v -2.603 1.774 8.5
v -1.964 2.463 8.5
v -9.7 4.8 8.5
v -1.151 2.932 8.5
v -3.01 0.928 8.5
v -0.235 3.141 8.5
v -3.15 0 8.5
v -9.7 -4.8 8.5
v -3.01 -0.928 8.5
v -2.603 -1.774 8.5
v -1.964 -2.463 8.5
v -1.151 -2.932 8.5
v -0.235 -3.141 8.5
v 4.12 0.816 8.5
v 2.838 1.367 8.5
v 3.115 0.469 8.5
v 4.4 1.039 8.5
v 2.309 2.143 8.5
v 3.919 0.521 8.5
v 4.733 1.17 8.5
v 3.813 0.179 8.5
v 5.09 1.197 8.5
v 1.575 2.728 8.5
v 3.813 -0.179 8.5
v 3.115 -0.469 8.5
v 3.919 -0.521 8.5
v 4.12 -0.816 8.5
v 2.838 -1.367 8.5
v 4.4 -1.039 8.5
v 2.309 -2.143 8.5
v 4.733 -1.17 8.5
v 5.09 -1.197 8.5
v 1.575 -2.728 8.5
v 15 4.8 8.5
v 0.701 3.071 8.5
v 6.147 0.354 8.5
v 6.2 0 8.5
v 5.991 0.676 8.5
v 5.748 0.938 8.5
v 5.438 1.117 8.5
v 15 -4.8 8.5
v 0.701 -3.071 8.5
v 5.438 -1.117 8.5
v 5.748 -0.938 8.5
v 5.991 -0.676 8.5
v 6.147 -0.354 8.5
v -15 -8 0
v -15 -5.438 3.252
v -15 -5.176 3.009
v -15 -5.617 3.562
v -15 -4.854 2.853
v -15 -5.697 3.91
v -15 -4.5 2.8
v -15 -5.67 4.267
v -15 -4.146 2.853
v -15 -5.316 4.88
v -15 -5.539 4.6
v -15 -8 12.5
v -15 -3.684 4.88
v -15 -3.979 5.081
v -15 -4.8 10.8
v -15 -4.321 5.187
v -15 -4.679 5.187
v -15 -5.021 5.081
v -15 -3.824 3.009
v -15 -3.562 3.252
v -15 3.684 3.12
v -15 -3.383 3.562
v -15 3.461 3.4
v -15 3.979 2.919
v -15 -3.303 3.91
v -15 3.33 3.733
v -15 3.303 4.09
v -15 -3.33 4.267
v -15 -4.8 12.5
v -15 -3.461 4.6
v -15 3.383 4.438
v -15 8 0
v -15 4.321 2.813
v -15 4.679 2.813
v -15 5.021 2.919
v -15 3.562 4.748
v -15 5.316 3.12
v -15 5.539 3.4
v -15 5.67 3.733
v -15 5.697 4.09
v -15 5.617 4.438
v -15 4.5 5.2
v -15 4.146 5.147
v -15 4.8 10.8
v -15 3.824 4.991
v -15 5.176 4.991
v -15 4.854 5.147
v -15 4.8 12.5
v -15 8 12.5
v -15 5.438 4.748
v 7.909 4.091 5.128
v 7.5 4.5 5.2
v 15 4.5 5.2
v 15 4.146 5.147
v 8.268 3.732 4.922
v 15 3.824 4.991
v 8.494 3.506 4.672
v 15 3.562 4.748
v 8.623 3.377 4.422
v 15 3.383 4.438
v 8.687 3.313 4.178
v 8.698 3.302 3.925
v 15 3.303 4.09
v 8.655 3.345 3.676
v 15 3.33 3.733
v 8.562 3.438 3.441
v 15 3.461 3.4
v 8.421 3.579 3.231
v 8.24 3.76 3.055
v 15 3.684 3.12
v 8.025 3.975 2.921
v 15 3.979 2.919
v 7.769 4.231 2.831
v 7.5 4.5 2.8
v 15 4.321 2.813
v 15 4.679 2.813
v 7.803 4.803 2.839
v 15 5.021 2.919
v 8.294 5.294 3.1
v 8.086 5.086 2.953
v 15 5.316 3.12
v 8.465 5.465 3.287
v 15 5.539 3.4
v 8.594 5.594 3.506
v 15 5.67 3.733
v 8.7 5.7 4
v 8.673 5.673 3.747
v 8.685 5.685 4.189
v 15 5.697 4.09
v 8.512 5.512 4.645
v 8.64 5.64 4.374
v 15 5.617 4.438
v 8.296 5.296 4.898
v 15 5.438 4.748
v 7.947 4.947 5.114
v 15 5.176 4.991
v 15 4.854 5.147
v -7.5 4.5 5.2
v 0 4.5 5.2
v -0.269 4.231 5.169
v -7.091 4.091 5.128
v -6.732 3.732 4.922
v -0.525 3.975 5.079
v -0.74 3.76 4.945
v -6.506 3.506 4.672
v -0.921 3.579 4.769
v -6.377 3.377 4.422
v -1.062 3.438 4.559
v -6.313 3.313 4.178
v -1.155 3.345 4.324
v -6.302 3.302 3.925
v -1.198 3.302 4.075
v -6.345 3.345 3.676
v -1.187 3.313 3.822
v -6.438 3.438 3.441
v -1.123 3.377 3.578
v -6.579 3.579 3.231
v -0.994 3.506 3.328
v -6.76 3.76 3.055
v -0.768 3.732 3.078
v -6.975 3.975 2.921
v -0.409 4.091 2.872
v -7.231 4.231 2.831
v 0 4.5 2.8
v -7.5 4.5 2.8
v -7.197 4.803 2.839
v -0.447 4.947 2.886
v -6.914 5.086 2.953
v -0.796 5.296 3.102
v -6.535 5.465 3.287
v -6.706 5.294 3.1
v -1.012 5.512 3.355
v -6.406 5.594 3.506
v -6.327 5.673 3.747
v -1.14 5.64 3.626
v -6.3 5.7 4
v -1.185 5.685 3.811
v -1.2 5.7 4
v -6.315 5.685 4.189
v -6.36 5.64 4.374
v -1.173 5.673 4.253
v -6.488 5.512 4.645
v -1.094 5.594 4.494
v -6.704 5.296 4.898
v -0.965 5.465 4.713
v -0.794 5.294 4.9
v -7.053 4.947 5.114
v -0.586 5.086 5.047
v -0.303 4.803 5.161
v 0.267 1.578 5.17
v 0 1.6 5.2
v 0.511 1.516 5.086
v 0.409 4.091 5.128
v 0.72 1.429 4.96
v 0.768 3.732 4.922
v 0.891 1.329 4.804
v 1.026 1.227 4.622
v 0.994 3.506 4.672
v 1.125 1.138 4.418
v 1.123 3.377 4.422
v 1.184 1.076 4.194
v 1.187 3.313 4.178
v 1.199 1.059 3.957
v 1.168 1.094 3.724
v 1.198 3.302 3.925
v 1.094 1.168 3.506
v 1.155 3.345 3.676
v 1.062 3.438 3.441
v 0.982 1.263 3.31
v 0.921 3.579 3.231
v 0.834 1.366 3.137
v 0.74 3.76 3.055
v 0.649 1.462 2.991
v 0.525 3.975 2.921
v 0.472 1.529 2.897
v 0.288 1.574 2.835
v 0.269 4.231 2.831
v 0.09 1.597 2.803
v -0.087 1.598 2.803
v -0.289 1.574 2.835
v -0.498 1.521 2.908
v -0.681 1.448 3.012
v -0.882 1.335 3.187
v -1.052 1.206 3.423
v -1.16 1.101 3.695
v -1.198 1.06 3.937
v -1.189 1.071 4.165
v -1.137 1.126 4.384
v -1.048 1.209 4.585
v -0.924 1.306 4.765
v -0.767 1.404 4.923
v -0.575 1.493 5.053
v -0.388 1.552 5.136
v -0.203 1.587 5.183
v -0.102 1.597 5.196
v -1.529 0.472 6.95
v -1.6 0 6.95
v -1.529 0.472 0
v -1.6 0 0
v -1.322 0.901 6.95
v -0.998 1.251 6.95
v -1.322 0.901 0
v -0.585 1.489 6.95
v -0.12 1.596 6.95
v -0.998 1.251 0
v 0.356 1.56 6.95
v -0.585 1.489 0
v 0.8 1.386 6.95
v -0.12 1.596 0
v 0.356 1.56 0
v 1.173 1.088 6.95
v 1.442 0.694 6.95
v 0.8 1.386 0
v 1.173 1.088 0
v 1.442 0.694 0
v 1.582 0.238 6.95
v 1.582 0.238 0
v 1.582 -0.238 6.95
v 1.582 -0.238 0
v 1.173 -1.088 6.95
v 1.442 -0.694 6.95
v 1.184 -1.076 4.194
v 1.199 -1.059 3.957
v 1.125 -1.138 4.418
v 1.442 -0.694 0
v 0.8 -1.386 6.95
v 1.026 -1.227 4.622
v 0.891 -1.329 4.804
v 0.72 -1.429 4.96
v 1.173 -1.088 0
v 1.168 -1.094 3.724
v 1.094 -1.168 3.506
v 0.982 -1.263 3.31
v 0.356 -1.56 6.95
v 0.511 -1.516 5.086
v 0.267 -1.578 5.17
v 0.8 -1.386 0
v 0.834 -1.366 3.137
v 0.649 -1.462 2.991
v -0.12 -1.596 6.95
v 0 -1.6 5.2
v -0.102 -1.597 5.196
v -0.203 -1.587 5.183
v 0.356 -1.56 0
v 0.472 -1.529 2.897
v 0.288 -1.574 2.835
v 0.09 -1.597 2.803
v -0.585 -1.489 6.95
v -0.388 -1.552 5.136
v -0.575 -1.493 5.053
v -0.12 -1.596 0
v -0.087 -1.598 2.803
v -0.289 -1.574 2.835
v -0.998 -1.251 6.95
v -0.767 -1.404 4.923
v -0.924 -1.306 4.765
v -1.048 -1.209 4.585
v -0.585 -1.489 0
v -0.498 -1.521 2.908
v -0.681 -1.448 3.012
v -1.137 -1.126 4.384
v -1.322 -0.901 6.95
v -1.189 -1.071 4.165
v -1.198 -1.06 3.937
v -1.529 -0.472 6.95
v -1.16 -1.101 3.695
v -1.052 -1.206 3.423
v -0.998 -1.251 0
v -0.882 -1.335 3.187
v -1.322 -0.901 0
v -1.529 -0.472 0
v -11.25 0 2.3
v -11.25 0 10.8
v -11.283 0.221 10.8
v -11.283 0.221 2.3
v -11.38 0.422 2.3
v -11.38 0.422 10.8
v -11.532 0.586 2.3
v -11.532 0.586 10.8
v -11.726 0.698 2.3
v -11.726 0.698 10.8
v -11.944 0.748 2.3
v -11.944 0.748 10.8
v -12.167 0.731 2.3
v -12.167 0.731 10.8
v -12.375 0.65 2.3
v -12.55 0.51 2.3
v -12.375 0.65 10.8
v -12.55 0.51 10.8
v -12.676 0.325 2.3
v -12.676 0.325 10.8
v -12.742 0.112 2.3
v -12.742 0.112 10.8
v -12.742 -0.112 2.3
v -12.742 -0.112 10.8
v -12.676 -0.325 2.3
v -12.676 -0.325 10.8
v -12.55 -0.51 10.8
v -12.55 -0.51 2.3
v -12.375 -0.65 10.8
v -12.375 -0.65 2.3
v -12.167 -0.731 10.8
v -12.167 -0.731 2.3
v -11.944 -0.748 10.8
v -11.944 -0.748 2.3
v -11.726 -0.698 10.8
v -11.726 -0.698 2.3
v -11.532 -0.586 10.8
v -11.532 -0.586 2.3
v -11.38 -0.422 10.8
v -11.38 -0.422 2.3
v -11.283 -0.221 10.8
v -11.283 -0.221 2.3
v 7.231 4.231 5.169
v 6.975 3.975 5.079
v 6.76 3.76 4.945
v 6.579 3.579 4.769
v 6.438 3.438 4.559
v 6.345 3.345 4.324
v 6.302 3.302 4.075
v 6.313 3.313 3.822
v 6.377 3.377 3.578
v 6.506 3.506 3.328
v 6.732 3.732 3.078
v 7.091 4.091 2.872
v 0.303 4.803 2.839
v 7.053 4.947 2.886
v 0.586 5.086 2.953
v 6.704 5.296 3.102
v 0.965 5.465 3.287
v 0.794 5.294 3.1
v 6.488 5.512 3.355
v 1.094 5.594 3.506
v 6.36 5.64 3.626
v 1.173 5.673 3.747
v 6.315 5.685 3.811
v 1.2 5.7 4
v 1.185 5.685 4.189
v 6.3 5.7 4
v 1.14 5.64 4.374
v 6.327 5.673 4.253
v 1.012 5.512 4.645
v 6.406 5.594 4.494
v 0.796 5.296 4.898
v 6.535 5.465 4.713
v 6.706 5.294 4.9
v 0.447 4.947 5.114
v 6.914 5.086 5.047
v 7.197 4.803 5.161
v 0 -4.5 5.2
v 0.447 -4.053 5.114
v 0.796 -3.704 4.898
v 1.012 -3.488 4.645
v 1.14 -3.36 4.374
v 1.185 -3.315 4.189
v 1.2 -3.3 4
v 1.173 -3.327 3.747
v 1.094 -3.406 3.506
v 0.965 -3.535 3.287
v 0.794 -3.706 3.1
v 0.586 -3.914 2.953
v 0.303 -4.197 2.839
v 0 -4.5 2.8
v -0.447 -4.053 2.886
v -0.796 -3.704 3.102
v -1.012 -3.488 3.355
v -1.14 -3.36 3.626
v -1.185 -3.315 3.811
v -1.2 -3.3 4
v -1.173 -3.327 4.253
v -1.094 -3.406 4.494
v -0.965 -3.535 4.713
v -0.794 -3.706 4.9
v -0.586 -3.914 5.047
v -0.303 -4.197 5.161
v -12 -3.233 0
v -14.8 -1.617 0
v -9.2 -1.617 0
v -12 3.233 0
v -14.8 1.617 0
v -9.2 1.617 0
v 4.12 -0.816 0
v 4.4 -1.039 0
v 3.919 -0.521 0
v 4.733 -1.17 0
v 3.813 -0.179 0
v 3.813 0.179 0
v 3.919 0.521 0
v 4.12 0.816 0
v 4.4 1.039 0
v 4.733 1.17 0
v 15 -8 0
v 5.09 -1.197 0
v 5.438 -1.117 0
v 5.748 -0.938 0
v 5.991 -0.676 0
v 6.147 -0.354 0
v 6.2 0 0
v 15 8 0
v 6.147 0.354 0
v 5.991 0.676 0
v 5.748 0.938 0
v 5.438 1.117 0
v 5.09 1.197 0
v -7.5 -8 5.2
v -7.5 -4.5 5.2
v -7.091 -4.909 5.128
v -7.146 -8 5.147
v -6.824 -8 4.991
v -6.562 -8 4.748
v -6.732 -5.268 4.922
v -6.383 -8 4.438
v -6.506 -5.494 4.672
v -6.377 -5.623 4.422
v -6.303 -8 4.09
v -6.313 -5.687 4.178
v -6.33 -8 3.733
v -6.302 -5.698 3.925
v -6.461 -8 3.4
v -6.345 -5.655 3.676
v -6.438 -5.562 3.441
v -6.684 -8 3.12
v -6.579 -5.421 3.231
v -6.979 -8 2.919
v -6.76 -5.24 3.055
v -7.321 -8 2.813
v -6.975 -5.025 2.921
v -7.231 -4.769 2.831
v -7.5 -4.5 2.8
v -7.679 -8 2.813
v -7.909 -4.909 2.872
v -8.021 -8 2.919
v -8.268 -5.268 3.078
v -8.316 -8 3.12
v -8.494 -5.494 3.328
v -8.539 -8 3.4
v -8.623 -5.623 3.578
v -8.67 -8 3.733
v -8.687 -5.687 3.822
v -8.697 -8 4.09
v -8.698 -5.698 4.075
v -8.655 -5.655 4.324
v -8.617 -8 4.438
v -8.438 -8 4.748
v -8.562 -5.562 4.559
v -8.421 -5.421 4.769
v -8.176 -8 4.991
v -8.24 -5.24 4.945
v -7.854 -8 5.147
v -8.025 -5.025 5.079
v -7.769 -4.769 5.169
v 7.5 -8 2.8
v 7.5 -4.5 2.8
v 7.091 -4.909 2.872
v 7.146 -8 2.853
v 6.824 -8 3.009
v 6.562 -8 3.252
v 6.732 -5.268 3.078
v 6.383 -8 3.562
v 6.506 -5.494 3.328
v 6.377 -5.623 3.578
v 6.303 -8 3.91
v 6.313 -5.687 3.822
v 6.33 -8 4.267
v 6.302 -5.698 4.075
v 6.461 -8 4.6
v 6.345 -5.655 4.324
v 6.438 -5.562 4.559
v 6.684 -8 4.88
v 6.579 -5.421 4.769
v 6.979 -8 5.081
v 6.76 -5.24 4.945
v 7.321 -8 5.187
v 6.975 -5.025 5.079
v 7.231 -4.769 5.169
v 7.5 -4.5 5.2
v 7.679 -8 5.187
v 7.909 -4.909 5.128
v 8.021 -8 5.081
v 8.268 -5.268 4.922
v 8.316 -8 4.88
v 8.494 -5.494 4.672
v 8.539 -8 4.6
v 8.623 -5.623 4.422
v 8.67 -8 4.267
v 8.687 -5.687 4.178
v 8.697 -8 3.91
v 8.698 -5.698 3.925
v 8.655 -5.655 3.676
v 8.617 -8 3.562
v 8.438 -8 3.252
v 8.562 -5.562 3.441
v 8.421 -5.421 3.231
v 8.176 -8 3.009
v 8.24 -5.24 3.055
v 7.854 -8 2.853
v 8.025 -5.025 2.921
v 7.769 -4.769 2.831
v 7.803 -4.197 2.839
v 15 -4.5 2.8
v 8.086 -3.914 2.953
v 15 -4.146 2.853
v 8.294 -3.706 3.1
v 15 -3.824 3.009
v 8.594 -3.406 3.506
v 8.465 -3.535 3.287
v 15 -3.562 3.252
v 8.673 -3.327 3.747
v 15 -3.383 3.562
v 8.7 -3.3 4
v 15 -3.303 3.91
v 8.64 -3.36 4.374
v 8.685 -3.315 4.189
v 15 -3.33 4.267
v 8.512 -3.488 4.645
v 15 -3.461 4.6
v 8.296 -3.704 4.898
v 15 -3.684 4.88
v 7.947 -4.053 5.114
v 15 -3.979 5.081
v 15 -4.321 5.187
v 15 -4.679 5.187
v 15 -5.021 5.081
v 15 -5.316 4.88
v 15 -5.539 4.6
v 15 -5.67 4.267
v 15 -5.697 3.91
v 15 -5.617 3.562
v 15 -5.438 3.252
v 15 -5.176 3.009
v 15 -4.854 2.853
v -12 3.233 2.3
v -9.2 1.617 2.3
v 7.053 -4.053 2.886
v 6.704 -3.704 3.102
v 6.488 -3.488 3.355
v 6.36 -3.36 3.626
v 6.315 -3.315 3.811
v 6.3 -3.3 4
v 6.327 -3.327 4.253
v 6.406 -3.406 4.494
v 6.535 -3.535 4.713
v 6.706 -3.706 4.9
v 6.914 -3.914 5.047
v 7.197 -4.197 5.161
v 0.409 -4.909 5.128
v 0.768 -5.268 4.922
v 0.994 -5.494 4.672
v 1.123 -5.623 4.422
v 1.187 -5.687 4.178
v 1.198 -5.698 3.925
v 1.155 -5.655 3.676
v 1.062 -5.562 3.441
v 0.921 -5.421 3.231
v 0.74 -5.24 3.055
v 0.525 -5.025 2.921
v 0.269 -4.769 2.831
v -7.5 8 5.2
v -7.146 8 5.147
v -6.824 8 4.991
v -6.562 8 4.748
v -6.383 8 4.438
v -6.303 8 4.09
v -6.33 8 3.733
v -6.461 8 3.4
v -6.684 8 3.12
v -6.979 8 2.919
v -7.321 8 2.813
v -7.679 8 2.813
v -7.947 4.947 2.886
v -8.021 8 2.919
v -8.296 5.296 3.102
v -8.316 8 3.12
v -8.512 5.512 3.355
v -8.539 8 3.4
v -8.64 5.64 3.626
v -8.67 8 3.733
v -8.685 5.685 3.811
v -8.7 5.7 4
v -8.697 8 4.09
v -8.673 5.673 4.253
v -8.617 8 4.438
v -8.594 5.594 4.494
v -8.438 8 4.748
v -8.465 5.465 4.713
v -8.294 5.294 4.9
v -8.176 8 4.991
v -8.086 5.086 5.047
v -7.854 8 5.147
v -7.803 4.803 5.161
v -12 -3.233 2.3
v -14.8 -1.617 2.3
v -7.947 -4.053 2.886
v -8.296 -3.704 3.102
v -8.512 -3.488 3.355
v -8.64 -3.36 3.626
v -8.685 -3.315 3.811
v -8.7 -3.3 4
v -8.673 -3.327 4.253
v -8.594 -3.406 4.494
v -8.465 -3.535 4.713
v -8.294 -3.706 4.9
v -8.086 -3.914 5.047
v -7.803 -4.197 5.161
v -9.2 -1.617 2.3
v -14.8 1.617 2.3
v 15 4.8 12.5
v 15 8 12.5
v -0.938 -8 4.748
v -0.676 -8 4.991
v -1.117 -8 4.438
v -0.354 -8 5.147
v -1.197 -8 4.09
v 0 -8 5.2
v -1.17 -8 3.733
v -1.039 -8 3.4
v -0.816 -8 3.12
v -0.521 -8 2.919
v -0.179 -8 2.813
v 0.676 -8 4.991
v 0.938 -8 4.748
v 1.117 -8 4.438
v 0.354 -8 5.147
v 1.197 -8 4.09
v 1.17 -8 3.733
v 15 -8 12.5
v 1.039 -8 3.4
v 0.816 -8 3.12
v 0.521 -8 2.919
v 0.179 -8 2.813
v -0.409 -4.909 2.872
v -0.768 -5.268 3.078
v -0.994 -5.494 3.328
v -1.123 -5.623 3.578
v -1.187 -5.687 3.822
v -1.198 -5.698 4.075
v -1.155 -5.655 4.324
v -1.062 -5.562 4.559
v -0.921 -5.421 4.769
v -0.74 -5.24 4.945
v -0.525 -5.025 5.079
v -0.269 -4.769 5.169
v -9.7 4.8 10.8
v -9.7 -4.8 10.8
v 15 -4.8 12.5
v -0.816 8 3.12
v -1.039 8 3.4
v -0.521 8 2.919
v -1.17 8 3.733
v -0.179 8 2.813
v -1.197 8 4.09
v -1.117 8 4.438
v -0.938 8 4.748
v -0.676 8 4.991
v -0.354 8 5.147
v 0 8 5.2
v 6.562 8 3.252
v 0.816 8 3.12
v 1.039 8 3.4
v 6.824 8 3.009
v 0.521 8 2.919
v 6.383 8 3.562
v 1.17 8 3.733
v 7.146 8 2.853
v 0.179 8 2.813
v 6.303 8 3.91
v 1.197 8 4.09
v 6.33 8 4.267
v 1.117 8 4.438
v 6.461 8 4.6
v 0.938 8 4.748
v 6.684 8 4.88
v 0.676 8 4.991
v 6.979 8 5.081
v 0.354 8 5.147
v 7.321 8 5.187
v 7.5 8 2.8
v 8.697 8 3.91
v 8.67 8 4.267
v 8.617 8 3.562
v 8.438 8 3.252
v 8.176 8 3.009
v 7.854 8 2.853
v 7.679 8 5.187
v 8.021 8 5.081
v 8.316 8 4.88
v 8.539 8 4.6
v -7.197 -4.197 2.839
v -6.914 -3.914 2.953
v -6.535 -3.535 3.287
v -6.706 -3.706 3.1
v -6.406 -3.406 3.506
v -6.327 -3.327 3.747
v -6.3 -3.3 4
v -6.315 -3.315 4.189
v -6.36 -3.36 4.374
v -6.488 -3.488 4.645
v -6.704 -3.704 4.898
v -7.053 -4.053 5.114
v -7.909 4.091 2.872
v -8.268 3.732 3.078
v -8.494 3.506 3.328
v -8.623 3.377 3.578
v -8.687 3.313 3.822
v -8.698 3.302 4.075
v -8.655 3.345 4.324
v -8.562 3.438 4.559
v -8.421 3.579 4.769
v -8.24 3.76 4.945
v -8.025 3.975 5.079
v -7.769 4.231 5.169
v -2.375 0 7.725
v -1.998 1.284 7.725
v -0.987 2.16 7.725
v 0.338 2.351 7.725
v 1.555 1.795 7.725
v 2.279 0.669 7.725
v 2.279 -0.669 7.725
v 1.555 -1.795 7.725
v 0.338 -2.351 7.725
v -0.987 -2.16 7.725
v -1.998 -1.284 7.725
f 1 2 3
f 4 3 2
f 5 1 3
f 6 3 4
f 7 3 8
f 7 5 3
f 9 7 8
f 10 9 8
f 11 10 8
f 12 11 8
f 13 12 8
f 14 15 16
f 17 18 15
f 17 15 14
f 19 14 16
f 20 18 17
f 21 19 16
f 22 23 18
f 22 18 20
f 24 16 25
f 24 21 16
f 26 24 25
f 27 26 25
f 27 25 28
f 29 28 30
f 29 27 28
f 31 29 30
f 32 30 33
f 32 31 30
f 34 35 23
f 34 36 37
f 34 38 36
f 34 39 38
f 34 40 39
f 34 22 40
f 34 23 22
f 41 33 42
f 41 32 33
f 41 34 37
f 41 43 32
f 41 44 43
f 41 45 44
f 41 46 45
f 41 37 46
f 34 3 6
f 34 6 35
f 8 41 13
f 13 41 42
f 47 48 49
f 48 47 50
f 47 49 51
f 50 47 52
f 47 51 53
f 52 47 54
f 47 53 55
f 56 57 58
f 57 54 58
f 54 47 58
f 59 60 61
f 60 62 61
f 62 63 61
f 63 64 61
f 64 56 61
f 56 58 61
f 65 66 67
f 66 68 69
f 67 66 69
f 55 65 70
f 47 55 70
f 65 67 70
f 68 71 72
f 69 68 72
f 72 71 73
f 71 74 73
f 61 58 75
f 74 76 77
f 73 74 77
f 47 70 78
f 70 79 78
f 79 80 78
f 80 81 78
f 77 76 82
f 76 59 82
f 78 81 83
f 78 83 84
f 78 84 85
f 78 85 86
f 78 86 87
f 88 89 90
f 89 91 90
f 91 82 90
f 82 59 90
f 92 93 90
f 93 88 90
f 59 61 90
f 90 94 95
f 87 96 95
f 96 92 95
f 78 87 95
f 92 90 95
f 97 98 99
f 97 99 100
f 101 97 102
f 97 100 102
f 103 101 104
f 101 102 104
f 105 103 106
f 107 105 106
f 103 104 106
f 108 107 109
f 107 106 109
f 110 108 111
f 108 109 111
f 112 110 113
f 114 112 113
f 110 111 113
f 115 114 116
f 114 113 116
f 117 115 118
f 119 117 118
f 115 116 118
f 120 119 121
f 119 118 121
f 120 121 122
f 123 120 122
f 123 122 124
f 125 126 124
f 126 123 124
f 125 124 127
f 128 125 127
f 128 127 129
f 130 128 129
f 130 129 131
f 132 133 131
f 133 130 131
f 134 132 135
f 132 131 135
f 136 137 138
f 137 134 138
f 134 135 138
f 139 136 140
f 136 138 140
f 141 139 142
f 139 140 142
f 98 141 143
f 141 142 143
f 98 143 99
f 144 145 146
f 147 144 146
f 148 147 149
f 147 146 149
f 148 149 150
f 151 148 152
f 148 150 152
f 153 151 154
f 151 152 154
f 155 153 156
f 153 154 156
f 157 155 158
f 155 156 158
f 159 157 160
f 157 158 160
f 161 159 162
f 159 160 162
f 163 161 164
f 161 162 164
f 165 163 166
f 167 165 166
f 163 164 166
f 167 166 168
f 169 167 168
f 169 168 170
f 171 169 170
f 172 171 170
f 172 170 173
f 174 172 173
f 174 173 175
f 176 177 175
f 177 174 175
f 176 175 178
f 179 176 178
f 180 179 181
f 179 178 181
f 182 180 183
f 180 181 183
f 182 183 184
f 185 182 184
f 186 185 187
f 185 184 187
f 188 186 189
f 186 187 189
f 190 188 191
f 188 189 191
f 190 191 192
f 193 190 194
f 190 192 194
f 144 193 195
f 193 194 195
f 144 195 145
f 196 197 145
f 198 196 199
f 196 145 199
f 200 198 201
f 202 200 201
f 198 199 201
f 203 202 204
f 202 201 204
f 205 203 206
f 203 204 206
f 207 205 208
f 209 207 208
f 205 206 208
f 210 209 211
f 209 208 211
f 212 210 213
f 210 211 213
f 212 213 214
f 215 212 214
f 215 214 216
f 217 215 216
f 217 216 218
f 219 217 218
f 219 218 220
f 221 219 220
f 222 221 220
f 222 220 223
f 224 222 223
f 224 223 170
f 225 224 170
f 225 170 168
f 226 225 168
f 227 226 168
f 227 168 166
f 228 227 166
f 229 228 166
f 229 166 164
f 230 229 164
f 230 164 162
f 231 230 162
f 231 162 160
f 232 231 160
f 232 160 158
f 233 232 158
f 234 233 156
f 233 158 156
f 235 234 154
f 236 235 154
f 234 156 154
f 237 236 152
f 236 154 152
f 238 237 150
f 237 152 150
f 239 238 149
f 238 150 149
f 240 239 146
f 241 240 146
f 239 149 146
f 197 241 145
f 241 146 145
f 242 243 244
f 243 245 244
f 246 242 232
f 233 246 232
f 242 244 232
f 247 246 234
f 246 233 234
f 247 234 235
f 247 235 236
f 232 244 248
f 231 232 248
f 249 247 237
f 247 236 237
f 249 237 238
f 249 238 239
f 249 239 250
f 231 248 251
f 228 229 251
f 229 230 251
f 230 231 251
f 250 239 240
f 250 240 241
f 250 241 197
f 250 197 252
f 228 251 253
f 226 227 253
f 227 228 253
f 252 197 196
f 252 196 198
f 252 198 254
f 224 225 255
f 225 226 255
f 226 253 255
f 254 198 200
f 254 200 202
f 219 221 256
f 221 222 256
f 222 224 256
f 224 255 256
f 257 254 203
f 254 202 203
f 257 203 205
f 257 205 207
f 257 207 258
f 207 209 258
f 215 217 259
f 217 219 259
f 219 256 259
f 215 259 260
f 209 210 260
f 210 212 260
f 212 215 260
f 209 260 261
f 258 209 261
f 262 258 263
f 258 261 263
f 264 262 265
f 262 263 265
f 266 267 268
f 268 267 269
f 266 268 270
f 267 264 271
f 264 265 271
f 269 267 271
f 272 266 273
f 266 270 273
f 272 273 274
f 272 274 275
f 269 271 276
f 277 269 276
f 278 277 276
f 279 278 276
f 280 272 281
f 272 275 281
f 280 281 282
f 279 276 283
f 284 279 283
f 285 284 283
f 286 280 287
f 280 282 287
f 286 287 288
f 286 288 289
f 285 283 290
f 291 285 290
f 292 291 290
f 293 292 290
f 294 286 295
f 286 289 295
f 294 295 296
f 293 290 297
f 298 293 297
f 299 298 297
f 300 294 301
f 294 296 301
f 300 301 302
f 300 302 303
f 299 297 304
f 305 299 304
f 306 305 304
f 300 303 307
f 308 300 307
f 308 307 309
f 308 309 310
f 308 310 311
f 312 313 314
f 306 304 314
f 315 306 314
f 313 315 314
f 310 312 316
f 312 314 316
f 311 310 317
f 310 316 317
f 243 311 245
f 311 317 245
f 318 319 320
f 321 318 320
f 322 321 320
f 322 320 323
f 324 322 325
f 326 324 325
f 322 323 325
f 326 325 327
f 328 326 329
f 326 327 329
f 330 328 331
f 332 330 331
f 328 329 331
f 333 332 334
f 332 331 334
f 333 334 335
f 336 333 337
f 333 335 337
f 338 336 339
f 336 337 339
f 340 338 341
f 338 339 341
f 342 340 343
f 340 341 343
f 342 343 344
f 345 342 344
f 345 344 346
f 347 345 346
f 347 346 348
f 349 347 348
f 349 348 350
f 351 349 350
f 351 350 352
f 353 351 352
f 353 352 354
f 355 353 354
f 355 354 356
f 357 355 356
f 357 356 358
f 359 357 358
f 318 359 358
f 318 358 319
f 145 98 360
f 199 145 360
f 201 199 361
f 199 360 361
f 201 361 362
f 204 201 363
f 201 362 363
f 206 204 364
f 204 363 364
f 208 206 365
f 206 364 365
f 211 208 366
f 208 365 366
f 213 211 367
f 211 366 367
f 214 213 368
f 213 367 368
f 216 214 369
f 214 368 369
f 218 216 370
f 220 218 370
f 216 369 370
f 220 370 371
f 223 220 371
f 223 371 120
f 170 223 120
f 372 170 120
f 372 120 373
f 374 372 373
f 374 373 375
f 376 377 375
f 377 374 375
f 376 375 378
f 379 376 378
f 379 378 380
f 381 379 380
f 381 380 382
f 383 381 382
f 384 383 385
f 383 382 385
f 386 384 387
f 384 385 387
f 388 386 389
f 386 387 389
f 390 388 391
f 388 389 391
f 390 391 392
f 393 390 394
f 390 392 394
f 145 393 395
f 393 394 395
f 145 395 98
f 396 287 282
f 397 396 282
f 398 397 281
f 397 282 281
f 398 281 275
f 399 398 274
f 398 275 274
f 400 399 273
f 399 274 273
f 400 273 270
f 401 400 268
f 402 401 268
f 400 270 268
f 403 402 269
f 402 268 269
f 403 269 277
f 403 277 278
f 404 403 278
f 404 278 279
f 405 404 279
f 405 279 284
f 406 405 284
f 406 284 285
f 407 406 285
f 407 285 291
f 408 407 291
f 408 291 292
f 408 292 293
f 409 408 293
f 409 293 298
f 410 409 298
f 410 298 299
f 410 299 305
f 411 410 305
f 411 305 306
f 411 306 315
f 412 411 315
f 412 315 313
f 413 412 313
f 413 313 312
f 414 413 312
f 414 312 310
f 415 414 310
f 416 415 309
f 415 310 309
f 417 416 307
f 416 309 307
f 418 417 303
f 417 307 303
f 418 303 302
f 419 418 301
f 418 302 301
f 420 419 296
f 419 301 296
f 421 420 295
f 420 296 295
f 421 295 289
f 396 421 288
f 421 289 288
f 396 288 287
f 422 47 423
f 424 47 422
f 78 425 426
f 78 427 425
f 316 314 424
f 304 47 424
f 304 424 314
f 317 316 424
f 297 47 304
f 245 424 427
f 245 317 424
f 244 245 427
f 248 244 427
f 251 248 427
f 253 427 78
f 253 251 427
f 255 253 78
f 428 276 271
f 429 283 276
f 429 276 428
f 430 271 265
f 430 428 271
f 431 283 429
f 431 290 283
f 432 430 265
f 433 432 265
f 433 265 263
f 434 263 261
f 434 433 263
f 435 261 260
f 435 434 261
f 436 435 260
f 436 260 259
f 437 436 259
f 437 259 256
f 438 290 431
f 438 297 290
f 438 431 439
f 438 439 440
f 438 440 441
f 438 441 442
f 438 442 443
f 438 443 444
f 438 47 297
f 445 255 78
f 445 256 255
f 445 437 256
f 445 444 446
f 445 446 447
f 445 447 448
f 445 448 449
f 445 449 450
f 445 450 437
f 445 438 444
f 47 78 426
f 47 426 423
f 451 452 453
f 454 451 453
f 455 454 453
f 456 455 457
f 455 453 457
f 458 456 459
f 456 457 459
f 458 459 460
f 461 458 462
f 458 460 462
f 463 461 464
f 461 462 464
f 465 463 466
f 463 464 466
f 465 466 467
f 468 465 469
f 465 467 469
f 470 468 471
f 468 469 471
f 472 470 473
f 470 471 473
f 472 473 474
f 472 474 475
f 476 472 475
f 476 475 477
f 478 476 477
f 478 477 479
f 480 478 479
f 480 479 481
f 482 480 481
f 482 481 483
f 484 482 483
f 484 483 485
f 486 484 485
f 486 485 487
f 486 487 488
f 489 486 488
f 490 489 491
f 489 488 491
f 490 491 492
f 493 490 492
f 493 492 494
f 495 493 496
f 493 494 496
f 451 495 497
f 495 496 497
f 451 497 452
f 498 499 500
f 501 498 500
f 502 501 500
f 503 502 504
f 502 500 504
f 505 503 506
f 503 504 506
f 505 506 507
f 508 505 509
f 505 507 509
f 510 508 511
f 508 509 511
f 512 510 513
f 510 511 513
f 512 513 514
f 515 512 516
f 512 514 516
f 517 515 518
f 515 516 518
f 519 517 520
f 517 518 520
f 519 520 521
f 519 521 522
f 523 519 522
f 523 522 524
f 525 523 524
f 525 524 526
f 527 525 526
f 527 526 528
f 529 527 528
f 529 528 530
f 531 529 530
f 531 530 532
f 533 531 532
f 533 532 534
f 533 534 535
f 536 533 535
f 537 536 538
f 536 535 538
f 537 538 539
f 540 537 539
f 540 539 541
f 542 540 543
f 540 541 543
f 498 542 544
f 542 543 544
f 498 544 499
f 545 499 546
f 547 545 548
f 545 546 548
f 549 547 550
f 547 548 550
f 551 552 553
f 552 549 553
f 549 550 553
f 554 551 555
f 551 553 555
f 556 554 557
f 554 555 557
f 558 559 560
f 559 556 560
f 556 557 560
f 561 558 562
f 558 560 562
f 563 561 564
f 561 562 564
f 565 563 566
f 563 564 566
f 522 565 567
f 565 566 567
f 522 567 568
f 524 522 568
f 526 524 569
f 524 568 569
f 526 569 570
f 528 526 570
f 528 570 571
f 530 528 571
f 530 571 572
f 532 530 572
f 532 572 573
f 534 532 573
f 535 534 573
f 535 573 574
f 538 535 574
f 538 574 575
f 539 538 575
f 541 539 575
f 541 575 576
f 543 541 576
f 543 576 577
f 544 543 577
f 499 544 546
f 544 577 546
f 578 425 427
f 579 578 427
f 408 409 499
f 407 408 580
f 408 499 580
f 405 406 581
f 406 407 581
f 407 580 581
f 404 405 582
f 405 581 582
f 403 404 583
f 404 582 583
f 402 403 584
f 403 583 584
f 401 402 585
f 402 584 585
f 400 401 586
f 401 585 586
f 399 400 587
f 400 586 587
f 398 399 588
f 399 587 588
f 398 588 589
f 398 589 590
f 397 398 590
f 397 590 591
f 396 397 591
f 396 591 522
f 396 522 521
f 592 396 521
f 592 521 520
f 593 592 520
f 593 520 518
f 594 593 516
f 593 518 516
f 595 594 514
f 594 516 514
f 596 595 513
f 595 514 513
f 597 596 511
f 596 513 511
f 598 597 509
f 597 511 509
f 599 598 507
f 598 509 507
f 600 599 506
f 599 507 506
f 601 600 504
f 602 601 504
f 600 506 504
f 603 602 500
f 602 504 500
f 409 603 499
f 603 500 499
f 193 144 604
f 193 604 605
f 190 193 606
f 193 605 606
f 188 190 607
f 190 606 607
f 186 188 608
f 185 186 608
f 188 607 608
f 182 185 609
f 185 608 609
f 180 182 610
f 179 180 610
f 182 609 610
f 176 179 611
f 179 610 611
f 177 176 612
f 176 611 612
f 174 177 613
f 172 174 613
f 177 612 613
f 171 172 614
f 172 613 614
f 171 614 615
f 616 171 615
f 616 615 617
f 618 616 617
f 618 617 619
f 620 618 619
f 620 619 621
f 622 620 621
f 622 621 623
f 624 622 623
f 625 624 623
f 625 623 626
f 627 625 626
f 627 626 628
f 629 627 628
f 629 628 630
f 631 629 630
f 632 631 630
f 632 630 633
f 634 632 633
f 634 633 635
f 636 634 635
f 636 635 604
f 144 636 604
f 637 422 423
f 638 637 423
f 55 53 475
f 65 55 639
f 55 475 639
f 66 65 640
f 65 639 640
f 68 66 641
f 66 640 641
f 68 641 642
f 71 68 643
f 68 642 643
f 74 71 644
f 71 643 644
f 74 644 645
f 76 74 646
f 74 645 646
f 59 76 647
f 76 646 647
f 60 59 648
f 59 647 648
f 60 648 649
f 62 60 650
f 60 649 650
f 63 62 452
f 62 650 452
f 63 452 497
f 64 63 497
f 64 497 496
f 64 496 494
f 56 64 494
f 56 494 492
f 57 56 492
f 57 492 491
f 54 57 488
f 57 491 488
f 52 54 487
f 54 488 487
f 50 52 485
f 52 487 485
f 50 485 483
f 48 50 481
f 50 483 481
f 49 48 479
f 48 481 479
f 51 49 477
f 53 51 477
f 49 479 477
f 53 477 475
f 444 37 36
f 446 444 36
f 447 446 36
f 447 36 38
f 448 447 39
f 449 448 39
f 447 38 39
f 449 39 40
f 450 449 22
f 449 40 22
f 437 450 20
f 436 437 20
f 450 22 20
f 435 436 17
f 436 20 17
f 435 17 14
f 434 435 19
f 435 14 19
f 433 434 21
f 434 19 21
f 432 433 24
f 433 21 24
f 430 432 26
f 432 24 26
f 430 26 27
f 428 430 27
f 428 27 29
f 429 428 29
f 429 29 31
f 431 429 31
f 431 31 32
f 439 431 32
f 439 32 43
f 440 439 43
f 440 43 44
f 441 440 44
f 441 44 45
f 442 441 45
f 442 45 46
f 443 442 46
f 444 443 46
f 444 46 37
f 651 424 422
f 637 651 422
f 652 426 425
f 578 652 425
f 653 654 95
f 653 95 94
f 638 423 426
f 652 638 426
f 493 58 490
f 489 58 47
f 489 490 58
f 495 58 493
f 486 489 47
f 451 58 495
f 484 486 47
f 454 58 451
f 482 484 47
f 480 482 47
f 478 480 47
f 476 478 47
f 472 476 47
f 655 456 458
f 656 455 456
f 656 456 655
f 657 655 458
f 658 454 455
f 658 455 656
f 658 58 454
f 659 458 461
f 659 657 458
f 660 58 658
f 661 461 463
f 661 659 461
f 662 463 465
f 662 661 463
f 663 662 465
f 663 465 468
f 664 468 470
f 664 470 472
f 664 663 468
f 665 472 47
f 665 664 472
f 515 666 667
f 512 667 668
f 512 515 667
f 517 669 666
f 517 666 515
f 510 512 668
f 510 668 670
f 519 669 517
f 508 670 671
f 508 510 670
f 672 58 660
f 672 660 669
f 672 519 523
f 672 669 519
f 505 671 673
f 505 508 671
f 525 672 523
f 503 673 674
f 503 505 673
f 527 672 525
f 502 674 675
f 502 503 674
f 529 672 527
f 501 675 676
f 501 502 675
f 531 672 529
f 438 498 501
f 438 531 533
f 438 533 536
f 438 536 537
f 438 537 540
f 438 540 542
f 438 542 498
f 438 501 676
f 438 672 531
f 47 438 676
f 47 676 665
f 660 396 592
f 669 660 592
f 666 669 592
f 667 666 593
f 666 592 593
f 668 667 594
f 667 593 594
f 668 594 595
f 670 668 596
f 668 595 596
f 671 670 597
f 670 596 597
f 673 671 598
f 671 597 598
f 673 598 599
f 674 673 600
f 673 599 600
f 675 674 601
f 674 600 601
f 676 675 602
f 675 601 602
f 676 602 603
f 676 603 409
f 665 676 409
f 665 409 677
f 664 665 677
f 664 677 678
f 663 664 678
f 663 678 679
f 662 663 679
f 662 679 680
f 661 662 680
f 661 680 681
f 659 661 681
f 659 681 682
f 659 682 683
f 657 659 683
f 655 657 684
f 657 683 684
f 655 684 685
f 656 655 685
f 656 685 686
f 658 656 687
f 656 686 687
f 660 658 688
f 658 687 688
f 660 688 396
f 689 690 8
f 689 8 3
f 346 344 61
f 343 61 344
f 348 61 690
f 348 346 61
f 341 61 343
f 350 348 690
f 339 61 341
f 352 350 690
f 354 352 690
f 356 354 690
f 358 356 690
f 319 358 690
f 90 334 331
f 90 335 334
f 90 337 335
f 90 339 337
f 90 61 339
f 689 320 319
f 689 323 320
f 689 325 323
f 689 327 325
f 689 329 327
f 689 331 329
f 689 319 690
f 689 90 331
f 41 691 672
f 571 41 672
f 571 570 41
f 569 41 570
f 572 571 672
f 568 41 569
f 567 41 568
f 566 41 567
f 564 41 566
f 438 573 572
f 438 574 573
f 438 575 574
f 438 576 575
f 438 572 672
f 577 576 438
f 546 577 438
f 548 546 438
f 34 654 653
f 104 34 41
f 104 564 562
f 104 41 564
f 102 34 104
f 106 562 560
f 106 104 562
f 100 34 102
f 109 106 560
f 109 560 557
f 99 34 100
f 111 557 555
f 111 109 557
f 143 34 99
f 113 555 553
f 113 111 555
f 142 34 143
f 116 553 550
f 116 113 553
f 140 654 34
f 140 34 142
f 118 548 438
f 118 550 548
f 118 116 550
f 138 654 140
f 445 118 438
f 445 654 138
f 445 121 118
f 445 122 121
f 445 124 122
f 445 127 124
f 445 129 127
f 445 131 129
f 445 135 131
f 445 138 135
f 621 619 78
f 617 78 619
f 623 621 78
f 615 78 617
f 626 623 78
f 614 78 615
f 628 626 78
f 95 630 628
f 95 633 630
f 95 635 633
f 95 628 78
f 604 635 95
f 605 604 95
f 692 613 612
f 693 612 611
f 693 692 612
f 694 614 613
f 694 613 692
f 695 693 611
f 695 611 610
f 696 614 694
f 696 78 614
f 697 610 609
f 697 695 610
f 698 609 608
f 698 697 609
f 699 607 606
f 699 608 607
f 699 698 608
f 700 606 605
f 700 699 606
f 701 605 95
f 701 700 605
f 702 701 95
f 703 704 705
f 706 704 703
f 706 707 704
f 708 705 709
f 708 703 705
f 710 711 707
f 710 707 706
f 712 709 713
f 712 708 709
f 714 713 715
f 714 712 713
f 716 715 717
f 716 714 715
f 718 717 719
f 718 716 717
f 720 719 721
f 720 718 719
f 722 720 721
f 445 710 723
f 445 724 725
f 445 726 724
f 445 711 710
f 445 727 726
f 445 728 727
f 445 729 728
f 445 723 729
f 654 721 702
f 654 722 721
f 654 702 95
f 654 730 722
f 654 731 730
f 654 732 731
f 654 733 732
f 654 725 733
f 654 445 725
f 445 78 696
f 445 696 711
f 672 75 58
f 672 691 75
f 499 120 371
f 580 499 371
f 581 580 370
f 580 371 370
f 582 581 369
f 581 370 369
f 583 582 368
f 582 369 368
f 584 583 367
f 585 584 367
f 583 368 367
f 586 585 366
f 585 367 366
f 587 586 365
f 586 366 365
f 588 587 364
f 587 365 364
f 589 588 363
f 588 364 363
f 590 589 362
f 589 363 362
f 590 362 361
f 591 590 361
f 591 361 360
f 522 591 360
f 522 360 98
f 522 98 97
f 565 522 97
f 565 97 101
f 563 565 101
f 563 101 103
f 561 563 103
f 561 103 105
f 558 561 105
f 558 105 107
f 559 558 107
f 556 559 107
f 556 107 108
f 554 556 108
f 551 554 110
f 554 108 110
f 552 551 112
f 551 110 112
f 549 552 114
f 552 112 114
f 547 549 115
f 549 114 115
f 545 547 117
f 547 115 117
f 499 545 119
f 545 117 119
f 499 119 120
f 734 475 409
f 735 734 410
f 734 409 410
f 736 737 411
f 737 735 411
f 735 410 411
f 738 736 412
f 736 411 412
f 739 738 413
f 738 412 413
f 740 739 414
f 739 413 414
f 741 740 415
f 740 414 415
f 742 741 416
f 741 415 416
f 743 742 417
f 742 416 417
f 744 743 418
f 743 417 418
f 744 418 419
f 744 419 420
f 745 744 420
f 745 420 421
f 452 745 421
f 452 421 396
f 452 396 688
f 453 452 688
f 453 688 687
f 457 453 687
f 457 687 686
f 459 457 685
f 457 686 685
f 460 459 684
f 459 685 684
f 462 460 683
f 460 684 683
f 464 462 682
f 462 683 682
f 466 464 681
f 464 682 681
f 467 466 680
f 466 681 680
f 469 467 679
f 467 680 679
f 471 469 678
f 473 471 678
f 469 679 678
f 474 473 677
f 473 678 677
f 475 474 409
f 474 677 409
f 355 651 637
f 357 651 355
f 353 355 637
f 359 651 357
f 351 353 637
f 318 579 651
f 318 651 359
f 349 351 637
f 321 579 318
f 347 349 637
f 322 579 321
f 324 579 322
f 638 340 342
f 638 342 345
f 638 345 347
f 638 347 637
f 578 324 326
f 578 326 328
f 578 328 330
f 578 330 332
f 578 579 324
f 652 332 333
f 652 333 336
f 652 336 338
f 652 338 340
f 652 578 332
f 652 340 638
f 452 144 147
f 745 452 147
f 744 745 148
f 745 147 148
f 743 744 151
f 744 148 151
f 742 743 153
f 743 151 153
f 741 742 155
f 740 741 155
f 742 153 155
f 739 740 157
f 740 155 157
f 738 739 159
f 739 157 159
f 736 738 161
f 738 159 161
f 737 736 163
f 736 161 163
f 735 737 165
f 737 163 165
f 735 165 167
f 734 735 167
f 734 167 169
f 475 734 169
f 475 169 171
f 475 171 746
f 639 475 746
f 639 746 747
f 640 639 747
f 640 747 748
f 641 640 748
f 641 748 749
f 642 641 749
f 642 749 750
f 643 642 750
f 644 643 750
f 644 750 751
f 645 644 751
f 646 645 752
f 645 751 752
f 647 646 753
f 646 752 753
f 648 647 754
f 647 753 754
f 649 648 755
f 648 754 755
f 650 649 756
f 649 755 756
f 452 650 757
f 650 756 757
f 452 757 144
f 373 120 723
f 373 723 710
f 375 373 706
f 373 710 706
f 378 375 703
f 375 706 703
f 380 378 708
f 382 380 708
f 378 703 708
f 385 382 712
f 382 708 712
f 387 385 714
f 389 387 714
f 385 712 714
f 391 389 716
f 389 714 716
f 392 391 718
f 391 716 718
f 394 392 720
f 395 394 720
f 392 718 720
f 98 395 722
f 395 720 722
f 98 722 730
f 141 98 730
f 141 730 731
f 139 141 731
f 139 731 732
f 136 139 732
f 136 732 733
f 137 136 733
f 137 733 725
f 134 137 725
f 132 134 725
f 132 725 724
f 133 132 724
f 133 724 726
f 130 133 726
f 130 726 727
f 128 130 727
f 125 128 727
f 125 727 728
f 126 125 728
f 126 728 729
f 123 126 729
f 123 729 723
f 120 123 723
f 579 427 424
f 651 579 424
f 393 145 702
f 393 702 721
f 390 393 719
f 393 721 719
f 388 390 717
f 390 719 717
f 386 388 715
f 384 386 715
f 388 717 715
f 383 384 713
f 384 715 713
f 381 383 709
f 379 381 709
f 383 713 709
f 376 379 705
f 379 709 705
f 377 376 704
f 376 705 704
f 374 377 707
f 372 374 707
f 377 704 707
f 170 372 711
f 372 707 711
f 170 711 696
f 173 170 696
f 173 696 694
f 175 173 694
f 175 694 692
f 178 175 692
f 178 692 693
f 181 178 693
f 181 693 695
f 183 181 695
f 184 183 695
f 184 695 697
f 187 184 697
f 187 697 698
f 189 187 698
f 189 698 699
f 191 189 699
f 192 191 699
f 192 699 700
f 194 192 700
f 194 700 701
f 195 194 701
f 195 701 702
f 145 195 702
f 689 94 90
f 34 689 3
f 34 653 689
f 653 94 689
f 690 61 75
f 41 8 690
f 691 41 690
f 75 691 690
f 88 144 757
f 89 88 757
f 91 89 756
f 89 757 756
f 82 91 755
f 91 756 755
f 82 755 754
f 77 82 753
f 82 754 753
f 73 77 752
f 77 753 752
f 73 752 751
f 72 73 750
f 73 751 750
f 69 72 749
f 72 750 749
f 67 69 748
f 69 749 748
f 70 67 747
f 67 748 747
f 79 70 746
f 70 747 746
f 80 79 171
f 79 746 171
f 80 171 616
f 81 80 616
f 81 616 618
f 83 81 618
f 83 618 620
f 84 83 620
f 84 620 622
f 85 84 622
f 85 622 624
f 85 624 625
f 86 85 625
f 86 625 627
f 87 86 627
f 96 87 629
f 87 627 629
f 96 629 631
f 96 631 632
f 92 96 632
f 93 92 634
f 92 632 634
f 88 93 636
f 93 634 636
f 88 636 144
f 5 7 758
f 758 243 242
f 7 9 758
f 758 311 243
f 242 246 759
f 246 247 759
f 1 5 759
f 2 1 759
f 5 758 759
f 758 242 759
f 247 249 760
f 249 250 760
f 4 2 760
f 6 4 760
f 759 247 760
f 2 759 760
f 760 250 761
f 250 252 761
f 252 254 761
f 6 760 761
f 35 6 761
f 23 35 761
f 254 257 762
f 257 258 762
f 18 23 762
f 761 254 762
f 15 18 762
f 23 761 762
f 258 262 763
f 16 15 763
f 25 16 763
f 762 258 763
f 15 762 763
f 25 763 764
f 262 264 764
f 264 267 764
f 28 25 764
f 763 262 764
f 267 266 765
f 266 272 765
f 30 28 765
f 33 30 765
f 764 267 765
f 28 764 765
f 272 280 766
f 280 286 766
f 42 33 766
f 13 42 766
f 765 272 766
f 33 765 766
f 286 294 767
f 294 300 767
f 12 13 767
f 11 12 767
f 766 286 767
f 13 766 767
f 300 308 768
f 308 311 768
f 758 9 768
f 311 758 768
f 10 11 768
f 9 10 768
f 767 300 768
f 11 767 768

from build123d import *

# Parameters (mm, degrees)
BOSS_EXTRU_1_DEPTH                             = 15
ESQUISSE2_R                                    = 1.2
ENL_V_MAT_EXTRU_1_DEPTH                        = 26.243811123
ESQUISSE3_R                                    = 0.75
ENL_V_MAT_EXTRU_2_DEPTH                        = 20.006577809
ESQUISSE4_R                                    = 1.2
ENL_V_MAT_EXTRU_3_DEPTH                        = 34.470135942
BOSS_EXTRU_2_START                             = 2.3
ESQUISSE5_W                                    = 5.3
ESQUISSE5_H                                    = 9.6
ESQUISSE5_R                                    = 0.75
BOSS_EXTRU_2_DEPTH                             = 2.3
FRAISAGE_POUR_VIS_T_TE_FRAIS_E_M31_D           = 3.2
FRAISAGE_POUR_VIS_T_TE_FRAIS_E_M31_CSINK_D     = 6.3
FRAISAGE_POUR_VIS_T_TE_FRAIS_E_M31_CSINK_ANGLE = 90
ENL_V_MAT_EXTRU_4_DEPTH                        = 2.3
ESQUISSE9_R                                    = 1.2
ENL_V_MAT_EXTRU_5_DEPTH                        = 20.006577853


with BuildPart() as part:
    # Esquisse1 → Boss.-Extru.1 (new, symmetric)
    with BuildSketch(Plane(origin=(0, 0, 0), x_dir=(0, 0, -1), z_dir=(1, 0, 0))):
        Polygon((-12.5, -4.8), (-12.5, -8), (0, -8), (0, 8), (-12.5, 8), (-12.5, 4.8), (-8.5, 4.8), (-8.5, -4.8), align=None)
    extrude(amount=BOSS_EXTRU_1_DEPTH, both=True)

    # Esquisse2 → Enlèv. mat.-Extru.1 (cut, through all)
    with BuildSketch(Plane(origin=(0, 8, 0), x_dir=(1, 0, 0), z_dir=(0, 1, 0))):
        with Locations(Location((-7.5, -4, 0), (0, 0, 270))):
            Circle(ESQUISSE2_R)
        with Locations(Location((7.5, -4, 0), (0, 0, 90))):
            Circle(ESQUISSE2_R)
        with Locations(Location((0, -4, 0), (0, 0, 270))):
            Circle(ESQUISSE2_R)
    extrude(amount=-ENL_V_MAT_EXTRU_1_DEPTH, mode=Mode.SUBTRACT)

    # Esquisse3 → Enlèv. mat.-Extru.2 (cut, through all)
    with BuildSketch(Plane.XY.offset(8.5)):
        with Locations((-12, 0)):
            Circle(ESQUISSE3_R)
    extrude(amount=-ENL_V_MAT_EXTRU_2_DEPTH, mode=Mode.SUBTRACT)

    # Esquisse4 → Enlèv. mat.-Extru.3 (cut, through all)
    with BuildSketch(Plane(origin=(15, 0, 0), x_dir=(0, 0, -1), z_dir=(1, 0, 0))):
        with Locations((-4, -4.5)):
            Circle(ESQUISSE4_R)
        with Locations(Location((-4, 4.5, 0), (0, 0, 180))):
            Circle(ESQUISSE4_R)
    extrude(amount=-ENL_V_MAT_EXTRU_3_DEPTH, mode=Mode.SUBTRACT)

    # Esquisse5 → Boss.-Extru.2 (add)
    with BuildSketch(Plane.XY.offset(8.5).offset(BOSS_EXTRU_2_START)):
        with Locations((-12.35, 0)):
            Rectangle(ESQUISSE5_W, ESQUISSE5_H)
        with Locations((-12, 0)):
            Circle(ESQUISSE5_R, mode=Mode.SUBTRACT)
    extrude(amount=-BOSS_EXTRU_2_DEPTH)

    # Fraisage pour vis à tête fraisée M31 (through all)
    with Locations(Plane.XY.offset(8.5)):
        with Locations((0, 0)):
            CounterSinkHole(FRAISAGE_POUR_VIS_T_TE_FRAIS_E_M31_D / 2, FRAISAGE_POUR_VIS_T_TE_FRAIS_E_M31_CSINK_D / 2, counter_sink_angle=FRAISAGE_POUR_VIS_T_TE_FRAIS_E_M31_CSINK_ANGLE)

    # Esquisse8 → Enlèv. mat.-Extru.4 (cut)
    with BuildSketch(Plane(origin=(0, 0, 0), x_dir=(-1, 0, 0), z_dir=(0, 0, -1))):
        Polygon((14.8, 1.616580754), (12, 3.233161507), (9.2, 1.616580754), (9.2, -1.616580754), (12, -3.233161507), (14.8, -1.616580754), align=None)
    extrude(amount=-ENL_V_MAT_EXTRU_4_DEPTH, mode=Mode.SUBTRACT)

    # Esquisse9 → Enlèv. mat.-Extru.5 (cut, through all)
    with BuildSketch(Plane.XY.offset(8.5)):
        with Locations((5, 0)):
            Circle(ESQUISSE9_R)
    extrude(amount=-ENL_V_MAT_EXTRU_5_DEPTH, mode=Mode.SUBTRACT)


solid = part.part
